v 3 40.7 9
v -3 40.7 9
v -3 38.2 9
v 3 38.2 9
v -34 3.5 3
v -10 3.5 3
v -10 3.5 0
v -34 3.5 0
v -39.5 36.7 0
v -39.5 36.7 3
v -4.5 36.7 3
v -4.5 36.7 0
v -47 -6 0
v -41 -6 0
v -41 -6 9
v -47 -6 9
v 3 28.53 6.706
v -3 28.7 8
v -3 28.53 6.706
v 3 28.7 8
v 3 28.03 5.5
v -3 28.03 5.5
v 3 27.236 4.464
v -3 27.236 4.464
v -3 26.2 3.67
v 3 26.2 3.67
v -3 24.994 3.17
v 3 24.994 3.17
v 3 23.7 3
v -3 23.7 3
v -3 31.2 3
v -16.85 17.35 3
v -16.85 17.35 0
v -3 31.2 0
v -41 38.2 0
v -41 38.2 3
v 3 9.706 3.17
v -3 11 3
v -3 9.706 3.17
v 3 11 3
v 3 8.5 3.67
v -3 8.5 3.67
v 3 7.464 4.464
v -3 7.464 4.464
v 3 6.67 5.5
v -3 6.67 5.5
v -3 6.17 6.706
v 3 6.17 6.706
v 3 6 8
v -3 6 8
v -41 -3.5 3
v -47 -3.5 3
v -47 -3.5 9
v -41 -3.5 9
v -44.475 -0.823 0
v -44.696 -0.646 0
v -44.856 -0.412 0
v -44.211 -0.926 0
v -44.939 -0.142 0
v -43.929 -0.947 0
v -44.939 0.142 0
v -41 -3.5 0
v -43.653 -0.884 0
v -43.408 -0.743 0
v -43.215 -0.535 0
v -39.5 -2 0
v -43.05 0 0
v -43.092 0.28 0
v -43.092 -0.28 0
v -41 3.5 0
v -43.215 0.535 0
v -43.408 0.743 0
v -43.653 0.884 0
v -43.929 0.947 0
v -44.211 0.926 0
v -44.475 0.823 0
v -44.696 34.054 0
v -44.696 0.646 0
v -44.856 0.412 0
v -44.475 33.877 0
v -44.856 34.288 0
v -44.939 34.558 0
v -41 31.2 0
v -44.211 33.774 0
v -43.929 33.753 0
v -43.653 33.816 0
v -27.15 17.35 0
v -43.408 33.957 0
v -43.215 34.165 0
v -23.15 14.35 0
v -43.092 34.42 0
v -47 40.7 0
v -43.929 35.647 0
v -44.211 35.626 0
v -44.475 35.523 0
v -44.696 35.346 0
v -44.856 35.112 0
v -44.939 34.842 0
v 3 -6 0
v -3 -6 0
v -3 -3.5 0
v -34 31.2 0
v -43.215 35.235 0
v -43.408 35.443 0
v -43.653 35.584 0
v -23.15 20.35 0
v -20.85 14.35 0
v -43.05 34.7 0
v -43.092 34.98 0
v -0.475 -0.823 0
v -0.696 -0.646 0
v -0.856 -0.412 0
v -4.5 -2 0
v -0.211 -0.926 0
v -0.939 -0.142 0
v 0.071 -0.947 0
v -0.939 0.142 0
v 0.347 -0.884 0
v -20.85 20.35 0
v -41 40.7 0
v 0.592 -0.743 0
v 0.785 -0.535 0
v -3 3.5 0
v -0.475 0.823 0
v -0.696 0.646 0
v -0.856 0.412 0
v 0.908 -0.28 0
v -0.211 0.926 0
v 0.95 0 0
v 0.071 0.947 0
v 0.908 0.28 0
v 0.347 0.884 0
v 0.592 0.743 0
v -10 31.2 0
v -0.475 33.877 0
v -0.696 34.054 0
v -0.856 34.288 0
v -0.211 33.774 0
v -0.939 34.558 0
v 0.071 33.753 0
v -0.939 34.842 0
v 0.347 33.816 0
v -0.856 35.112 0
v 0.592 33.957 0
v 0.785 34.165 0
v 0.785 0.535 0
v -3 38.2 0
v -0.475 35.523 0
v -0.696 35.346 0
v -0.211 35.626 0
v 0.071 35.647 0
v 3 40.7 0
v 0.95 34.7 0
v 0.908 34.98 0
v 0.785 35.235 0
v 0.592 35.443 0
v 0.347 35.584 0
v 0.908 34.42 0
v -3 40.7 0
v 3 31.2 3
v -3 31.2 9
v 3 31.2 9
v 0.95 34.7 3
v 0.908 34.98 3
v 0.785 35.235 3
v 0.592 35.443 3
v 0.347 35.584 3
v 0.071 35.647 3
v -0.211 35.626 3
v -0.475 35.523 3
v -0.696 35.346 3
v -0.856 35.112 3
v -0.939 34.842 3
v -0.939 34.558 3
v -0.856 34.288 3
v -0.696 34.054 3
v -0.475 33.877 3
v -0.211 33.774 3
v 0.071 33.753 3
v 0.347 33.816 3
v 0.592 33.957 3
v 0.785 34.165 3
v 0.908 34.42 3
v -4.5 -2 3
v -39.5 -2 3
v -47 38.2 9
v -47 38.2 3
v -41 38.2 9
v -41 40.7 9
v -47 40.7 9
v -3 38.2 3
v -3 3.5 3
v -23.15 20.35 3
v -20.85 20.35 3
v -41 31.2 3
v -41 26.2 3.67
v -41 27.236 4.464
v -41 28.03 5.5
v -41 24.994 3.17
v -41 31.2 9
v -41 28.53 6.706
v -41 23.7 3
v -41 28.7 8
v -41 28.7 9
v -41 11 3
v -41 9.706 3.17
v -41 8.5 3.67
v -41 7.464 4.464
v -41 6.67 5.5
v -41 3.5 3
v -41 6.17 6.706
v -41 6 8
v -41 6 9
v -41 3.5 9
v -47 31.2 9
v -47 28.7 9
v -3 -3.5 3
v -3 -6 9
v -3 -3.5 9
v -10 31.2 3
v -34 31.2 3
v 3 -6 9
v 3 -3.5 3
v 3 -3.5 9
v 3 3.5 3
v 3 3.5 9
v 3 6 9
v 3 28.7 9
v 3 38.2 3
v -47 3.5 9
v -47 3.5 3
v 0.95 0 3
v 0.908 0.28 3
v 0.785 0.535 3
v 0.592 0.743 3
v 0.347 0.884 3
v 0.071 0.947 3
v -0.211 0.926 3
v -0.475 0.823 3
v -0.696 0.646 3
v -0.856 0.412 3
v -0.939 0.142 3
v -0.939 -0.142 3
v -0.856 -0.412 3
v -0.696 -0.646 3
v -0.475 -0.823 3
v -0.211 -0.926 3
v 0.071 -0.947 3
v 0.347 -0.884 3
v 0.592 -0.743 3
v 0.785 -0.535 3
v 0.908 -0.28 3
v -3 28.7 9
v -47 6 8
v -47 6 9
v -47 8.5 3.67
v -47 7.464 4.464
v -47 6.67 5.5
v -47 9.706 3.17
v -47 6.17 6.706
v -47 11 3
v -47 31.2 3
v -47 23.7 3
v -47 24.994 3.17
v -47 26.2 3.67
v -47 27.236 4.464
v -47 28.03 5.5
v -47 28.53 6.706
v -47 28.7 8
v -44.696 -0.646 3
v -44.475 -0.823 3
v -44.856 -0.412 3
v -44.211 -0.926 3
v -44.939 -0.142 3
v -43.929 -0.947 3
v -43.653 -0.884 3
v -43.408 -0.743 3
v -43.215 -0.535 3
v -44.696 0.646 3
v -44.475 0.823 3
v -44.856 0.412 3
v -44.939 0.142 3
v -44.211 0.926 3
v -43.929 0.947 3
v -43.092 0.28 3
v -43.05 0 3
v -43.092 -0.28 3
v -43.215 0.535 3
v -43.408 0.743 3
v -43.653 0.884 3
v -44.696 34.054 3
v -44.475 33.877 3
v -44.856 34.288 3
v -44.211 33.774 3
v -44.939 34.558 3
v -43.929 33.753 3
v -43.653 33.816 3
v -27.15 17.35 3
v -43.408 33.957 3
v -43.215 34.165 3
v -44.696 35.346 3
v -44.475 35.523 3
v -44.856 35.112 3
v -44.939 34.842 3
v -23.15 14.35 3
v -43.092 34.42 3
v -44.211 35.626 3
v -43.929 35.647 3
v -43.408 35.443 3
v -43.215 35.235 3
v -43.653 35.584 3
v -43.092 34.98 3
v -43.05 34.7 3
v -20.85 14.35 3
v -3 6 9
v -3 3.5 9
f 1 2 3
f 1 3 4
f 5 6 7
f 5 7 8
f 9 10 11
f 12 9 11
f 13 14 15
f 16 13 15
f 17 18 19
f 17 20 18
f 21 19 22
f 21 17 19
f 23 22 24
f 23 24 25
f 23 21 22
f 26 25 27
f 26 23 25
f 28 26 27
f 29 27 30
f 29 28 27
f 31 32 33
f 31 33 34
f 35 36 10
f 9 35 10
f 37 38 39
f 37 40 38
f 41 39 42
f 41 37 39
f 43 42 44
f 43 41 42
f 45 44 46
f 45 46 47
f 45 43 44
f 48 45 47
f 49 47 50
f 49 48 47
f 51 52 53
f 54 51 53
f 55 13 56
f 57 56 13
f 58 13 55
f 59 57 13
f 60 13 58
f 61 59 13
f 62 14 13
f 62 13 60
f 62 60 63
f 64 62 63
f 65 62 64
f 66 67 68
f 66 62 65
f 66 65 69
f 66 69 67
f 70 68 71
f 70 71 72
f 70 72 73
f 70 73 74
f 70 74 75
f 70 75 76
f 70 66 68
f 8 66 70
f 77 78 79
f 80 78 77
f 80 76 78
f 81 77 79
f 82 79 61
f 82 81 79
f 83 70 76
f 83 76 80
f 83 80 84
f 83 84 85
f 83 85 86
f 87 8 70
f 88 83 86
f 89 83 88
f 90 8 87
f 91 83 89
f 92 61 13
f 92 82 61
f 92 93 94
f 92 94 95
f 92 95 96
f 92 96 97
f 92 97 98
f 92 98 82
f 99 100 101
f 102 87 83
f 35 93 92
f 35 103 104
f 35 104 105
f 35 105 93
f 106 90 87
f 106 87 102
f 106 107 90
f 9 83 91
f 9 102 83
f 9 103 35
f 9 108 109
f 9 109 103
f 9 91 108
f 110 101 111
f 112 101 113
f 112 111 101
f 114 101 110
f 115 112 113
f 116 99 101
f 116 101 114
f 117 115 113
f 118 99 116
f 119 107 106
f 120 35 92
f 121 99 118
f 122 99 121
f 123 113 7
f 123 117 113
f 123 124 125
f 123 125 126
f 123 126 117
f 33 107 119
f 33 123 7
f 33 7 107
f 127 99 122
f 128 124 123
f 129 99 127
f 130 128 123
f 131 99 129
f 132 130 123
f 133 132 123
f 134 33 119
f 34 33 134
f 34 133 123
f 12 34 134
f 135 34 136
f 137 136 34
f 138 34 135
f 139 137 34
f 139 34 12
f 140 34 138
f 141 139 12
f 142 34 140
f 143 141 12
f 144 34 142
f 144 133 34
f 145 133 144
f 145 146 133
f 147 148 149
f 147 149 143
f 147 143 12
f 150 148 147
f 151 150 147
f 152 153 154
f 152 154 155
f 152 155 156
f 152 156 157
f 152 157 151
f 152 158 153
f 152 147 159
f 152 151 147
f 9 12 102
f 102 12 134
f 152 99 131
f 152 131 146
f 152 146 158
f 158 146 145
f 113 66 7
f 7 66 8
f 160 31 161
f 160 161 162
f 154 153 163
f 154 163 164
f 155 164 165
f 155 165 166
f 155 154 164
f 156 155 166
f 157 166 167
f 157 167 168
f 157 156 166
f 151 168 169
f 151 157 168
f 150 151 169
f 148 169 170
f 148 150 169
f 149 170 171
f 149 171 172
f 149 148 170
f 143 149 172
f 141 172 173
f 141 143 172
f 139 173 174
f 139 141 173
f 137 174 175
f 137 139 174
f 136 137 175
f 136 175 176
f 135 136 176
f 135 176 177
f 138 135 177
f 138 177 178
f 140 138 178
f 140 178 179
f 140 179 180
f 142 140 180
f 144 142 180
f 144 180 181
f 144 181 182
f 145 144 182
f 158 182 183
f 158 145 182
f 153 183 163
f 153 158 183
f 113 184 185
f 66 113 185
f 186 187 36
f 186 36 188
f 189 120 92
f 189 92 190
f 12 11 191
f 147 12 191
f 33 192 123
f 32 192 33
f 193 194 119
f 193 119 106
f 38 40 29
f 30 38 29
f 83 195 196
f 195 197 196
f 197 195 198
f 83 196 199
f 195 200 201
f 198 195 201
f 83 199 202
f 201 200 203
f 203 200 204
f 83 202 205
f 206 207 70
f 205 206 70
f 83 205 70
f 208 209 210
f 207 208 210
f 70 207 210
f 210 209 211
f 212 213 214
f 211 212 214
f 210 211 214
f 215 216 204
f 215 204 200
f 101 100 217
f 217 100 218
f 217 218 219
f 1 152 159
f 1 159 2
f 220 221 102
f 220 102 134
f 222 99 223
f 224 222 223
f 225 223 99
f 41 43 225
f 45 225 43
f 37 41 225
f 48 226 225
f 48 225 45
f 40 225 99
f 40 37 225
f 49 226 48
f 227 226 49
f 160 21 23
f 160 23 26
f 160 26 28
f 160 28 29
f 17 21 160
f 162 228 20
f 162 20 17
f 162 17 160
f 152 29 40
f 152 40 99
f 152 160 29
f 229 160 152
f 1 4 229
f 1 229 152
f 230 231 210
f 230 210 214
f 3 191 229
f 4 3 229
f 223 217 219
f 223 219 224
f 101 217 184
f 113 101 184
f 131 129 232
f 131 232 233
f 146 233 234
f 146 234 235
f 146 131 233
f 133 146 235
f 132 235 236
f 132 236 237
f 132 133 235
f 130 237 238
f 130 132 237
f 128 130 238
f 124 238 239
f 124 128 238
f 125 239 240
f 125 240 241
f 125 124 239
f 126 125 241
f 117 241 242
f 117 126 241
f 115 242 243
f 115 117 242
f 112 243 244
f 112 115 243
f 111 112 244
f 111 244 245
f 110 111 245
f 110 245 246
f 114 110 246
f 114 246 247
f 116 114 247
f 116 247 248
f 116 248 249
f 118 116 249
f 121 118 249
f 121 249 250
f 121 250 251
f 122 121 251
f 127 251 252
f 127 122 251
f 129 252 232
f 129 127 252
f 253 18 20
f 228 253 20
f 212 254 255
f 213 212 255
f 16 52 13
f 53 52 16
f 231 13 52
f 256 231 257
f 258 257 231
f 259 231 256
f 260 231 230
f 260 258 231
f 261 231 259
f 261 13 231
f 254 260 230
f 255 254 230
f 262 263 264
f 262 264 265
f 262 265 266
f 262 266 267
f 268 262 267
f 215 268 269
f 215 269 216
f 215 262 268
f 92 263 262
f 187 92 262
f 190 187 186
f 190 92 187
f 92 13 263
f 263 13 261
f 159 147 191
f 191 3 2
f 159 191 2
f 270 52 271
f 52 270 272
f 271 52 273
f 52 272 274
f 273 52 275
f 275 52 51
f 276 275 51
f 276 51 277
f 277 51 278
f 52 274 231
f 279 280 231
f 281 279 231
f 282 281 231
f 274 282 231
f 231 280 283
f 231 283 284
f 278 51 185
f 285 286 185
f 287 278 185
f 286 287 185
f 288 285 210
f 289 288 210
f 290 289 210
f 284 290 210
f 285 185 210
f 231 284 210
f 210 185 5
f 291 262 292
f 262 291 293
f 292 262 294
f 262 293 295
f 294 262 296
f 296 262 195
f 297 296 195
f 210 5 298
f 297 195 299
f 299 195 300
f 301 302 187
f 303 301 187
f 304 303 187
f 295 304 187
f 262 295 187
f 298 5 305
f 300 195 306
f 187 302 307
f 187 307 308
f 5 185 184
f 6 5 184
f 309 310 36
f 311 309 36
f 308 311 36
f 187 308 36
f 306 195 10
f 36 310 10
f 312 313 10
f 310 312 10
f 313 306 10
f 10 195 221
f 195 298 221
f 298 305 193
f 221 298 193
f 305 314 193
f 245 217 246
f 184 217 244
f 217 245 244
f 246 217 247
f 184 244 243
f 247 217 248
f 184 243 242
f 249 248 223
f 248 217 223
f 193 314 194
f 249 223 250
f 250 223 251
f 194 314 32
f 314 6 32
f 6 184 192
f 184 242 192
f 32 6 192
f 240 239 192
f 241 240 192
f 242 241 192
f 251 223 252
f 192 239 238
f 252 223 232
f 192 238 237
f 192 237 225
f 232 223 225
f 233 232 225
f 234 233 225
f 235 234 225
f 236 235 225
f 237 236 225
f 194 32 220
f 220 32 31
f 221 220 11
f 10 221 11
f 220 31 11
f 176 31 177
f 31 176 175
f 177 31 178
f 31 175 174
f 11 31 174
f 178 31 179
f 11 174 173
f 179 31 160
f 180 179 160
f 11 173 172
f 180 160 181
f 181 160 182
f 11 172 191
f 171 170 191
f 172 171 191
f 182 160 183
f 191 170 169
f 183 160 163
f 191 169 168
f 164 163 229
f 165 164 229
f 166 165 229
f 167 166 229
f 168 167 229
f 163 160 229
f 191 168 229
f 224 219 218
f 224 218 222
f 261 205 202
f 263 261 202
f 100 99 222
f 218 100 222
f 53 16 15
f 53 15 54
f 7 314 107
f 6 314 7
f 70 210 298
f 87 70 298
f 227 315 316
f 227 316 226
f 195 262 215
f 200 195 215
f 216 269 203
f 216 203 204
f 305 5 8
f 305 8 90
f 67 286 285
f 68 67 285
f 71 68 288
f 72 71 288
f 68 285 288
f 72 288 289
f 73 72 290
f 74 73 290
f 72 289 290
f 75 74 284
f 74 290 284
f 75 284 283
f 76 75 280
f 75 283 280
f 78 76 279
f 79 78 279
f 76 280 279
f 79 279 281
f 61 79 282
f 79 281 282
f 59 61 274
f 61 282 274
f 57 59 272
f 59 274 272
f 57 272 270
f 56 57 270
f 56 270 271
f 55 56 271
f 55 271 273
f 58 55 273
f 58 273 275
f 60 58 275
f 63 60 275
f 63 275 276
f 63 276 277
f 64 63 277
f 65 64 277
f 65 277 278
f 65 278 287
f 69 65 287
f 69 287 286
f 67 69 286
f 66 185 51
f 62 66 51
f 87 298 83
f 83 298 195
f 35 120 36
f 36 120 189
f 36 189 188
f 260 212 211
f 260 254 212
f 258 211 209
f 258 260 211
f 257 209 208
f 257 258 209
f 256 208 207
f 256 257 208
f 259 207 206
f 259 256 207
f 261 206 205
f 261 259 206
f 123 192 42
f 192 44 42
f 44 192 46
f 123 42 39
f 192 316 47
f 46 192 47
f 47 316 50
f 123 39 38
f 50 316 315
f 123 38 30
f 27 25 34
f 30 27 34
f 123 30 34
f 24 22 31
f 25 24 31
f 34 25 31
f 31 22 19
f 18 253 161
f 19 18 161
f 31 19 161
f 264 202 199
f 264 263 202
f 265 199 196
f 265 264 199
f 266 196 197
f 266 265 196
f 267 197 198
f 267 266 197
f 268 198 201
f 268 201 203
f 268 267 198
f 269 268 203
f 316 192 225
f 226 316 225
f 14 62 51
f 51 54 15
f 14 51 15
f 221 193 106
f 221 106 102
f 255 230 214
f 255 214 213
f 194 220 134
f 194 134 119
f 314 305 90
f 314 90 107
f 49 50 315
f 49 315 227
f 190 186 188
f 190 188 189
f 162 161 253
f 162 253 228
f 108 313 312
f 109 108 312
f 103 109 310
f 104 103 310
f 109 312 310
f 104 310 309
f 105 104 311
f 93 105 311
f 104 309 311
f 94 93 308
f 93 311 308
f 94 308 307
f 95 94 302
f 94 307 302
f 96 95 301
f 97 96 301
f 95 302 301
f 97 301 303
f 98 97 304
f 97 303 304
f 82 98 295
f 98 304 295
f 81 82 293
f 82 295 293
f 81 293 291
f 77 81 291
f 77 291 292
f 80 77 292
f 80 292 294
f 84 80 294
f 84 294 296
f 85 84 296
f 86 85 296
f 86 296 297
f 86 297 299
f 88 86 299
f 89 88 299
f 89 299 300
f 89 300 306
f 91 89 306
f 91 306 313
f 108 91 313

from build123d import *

# Parameters (mm, degrees)
ESQUISSE1_W                    = 6
ESQUISSE1_H                    = 42.7
ESQUISSE1_R                    = 0.95
BOSS_EXTRU_1_DEPTH             = 3
ESQUISSE2_W                    = 6
ESQUISSE2_H                    = 2.5
BOSS_EXTRU_2_DEPTH             = 6
BOSS_EXTRU_2_DIRECTION_2_REACH = 40.932
ESQUISSE3_W                    = 3
ESQUISSE3_H                    = 46.7
BOSS_EXTRU_4_DEPTH             = 44
ESQUISSE4_W                    = 9
ESQUISSE4_H                    = 2.5
BOSS_EXTRU_5_DEPTH             = 6
ENL_V_MAT_EXTRU_1_REACH        = 64.462
ESQUISSE5_R                    = 0.95
ENL_V_MAT_EXTRU_2_REACH        = 64.462
CONG_1_R                       = 5


with BuildPart() as part:
    # Esquisse1 → Boss.-Extru.1 (new body)
    with BuildSketch(Plane.XY):
        with Locations((0, 17.35)):
            Rectangle(ESQUISSE1_W, ESQUISSE1_H)
        Circle(ESQUISSE1_R, mode=Mode.SUBTRACT)
        with Locations((0, 34.7)):
            Circle(ESQUISSE1_R, mode=Mode.SUBTRACT)
    extrude(amount=BOSS_EXTRU_1_DEPTH)

    # Esquisse2 → Boss.-Extru.2 (add)
    with BuildSketch(Plane.XY.offset(3)):
        with Locations((0, 4.75)):
            Rectangle(ESQUISSE2_W, ESQUISSE2_H)
        with Locations((0, 39.45)):
            Rectangle(ESQUISSE2_W, ESQUISSE2_H)
        with Locations((0, 29.95)):
            Rectangle(ESQUISSE2_W, ESQUISSE2_H)
        with Locations((0, -4.75)):
            Rectangle(ESQUISSE2_W, ESQUISSE2_H)
    extrude(amount=BOSS_EXTRU_2_DEPTH)

    # Boss.-Extru.2 direction 2: up to this face of the body (flat: up to its plane)
    boss_extru_2_direction_2_end = Plane(part.part.faces().sort_by_distance((0, 17.35, 0))[0])
    # Esquisse2 → Boss.-Extru.2 direction 2 (add, up to the picked face)
    with BuildSketch(Plane.XY.offset(3), mode=Mode.PRIVATE) as boss_extru_2_direction_2_sk1:
        with Locations((0, 4.75)):
            Rectangle(ESQUISSE2_W, ESQUISSE2_H)
    boss_extru_2_direction_2_tool1 = split(extrude(boss_extru_2_direction_2_sk1.sketch, amount=-BOSS_EXTRU_2_DIRECTION_2_REACH, mode=Mode.PRIVATE), bisect_by=boss_extru_2_direction_2_end, keep=Keep.BOTH, mode=Mode.PRIVATE)
    # Esquisse2 → Boss.-Extru.2 direction 2 (add, up to the picked face)
    with BuildSketch(Plane.XY.offset(3), mode=Mode.PRIVATE) as boss_extru_2_direction_2_sk2:
        with Locations((0, 39.45)):
            Rectangle(ESQUISSE2_W, ESQUISSE2_H)
    boss_extru_2_direction_2_tool2 = split(extrude(boss_extru_2_direction_2_sk2.sketch, amount=-BOSS_EXTRU_2_DIRECTION_2_REACH, mode=Mode.PRIVATE), bisect_by=boss_extru_2_direction_2_end, keep=Keep.BOTH, mode=Mode.PRIVATE)
    # Esquisse2 → Boss.-Extru.2 direction 2 (add, up to the picked face)
    with BuildSketch(Plane.XY.offset(3), mode=Mode.PRIVATE) as boss_extru_2_direction_2_sk3:
        with Locations((0, 29.95)):
            Rectangle(ESQUISSE2_W, ESQUISSE2_H)
    boss_extru_2_direction_2_tool3 = split(extrude(boss_extru_2_direction_2_sk3.sketch, amount=-BOSS_EXTRU_2_DIRECTION_2_REACH, mode=Mode.PRIVATE), bisect_by=boss_extru_2_direction_2_end, keep=Keep.BOTH, mode=Mode.PRIVATE)
    # Esquisse2 → Boss.-Extru.2 direction 2 (add, up to the picked face)
    with BuildSketch(Plane.XY.offset(3), mode=Mode.PRIVATE) as boss_extru_2_direction_2_sk4:
        with Locations((0, -4.75)):
            Rectangle(ESQUISSE2_W, ESQUISSE2_H)
    boss_extru_2_direction_2_tool4 = split(extrude(boss_extru_2_direction_2_sk4.sketch, amount=-BOSS_EXTRU_2_DIRECTION_2_REACH, mode=Mode.PRIVATE), bisect_by=boss_extru_2_direction_2_end, keep=Keep.BOTH, mode=Mode.PRIVATE)
    add(boss_extru_2_direction_2_tool1.solids().sort_by(Axis((0, 4.75, 3), (0, 0, -1)))[0])
    add(boss_extru_2_direction_2_tool2.solids().sort_by(Axis((0, 39.45, 3), (0, 0, -1)))[0])
    add(boss_extru_2_direction_2_tool3.solids().sort_by(Axis((0, 29.95, 3), (0, 0, -1)))[0])
    add(boss_extru_2_direction_2_tool4.solids().sort_by(Axis((0, -4.75, 3), (0, 0, -1)))[0])

    # Esquisse3 → Boss.-Extru.4 (add)
    with BuildSketch(Plane.ZY.offset(3)):
        with Locations((1.5, 17.35)):
            Rectangle(ESQUISSE3_W, ESQUISSE3_H)
    extrude(amount=BOSS_EXTRU_4_DEPTH)

    # Esquisse4 → Boss.-Extru.5 (add)
    with BuildSketch(Plane.ZY.offset(47)):
        with Locations((4.5, 39.45)):
            Rectangle(ESQUISSE4_W, ESQUISSE4_H)
        with Locations((4.5, 29.95)):
            Rectangle(ESQUISSE4_W, ESQUISSE4_H)
        with Locations((4.5, 4.75)):
            Rectangle(ESQUISSE4_W, ESQUISSE4_H)
        with Locations((4.5, -4.75)):
            Rectangle(ESQUISSE4_W, ESQUISSE4_H)
    extrude(amount=-BOSS_EXTRU_5_DEPTH)

    # Esquisse5 → Enlèv. mat.-Extru.1 (cut, up to next)
    with BuildSketch(Plane.XY.offset(3), mode=Mode.PRIVATE) as enl_v_mat_extru_1_sk1:
        with Locations((-44, 34.7)):
            Circle(ESQUISSE5_R)
    enl_v_mat_extru_1_tool1 = extrude(enl_v_mat_extru_1_sk1.sketch, amount=-ENL_V_MAT_EXTRU_1_REACH, mode=Mode.PRIVATE) & part.part
    # Esquisse5 → Enlèv. mat.-Extru.1 (cut, up to next)
    with BuildSketch(Plane.XY.offset(3), mode=Mode.PRIVATE) as enl_v_mat_extru_1_sk2:
        with Locations((-44, 0)):
            Circle(ESQUISSE5_R)
    enl_v_mat_extru_1_tool2 = extrude(enl_v_mat_extru_1_sk2.sketch, amount=-ENL_V_MAT_EXTRU_1_REACH, mode=Mode.PRIVATE) & part.part
    add(enl_v_mat_extru_1_tool1.solids().sort_by_distance((-44, 34.7, 3))[0], mode=Mode.SUBTRACT)
    add(enl_v_mat_extru_1_tool2.solids().sort_by_distance((-44, 0, 3))[0], mode=Mode.SUBTRACT)

    # Esquisse6 → Enlèv. mat.-Extru.2 (cut, up to next)
    with BuildSketch(Plane.XY.offset(3), mode=Mode.PRIVATE) as enl_v_mat_extru_2_sk1:
        Polygon((-20.85, 20.35), (-23.15, 20.35), (-34, 31.2), (-10, 31.2), align=None)
    enl_v_mat_extru_2_tool1 = extrude(enl_v_mat_extru_2_sk1.sketch, amount=-ENL_V_MAT_EXTRU_2_REACH, mode=Mode.PRIVATE) & part.part
    # Esquisse6 → Enlèv. mat.-Extru.2 (cut, up to next)
    with BuildSketch(Plane.XY.offset(3), mode=Mode.PRIVATE) as enl_v_mat_extru_2_sk2:
        Polygon((-41, 28.7), (-41, 6), (-41, 3.5), (-27.15, 17.35), (-41, 31.2), align=None)
    enl_v_mat_extru_2_tool2 = extrude(enl_v_mat_extru_2_sk2.sketch, amount=-ENL_V_MAT_EXTRU_2_REACH, mode=Mode.PRIVATE) & part.part
    # Esquisse6 → Enlèv. mat.-Extru.2 (cut, up to next)
    with BuildSketch(Plane.XY.offset(3), mode=Mode.PRIVATE) as enl_v_mat_extru_2_sk3:
        Polygon((-3, 28.7), (-3, 6), (-3, 3.5), (-16.85, 17.35), (-3, 31.2), align=None)
    enl_v_mat_extru_2_tool3 = extrude(enl_v_mat_extru_2_sk3.sketch, amount=-ENL_V_MAT_EXTRU_2_REACH, mode=Mode.PRIVATE) & part.part
    # Esquisse6 → Enlèv. mat.-Extru.2 (cut, up to next)
    with BuildSketch(Plane.XY.offset(3), mode=Mode.PRIVATE) as enl_v_mat_extru_2_sk4:
        Polygon((-34, 3.5), (-23.15, 14.35), (-20.85, 14.35), (-10, 3.5), align=None)
    enl_v_mat_extru_2_tool4 = extrude(enl_v_mat_extru_2_sk4.sketch, amount=-ENL_V_MAT_EXTRU_2_REACH, mode=Mode.PRIVATE) & part.part
    # Esquisse6 → Enlèv. mat.-Extru.2 (cut, up to next)
    with BuildSketch(Plane.XY.offset(3), mode=Mode.PRIVATE) as enl_v_mat_extru_2_sk5:
        Polygon((-39.5, -2), (-41, -3.5), (-41, -6), (-3, -6), (-3, -3.5), (-4.5, -2), align=None)
    enl_v_mat_extru_2_tool5 = extrude(enl_v_mat_extru_2_sk5.sketch, amount=-ENL_V_MAT_EXTRU_2_REACH, mode=Mode.PRIVATE) & part.part
    # Esquisse6 → Enlèv. mat.-Extru.2 (cut, up to next)
    with BuildSketch(Plane.XY.offset(3), mode=Mode.PRIVATE) as enl_v_mat_extru_2_sk6:
        Polygon((-41, 40.7), (-41, 38.2), (-39.5, 36.7), (-4.5, 36.7), (-3, 38.2), (-3, 40.7), align=None)
    enl_v_mat_extru_2_tool6 = extrude(enl_v_mat_extru_2_sk6.sketch, amount=-ENL_V_MAT_EXTRU_2_REACH, mode=Mode.PRIVATE) & part.part
    add(enl_v_mat_extru_2_tool1.solids().sort_by_distance((-22, 27.267047, 3))[0], mode=Mode.SUBTRACT)
    add(enl_v_mat_extru_2_tool2.solids().sort_by_distance((-36.383333, 17.35, 3))[0], mode=Mode.SUBTRACT)
    add(enl_v_mat_extru_2_tool3.solids().sort_by_distance((-7.616667, 17.35, 3))[0], mode=Mode.SUBTRACT)
    add(enl_v_mat_extru_2_tool4.solids().sort_by_distance((-22, 7.432953, 3))[0], mode=Mode.SUBTRACT)
    add(enl_v_mat_extru_2_tool5.solids().sort_by_distance((-22, -4.022538, 3))[0], mode=Mode.SUBTRACT)
    add(enl_v_mat_extru_2_tool6.solids().sort_by_distance((-22, 38.722538, 3))[0], mode=Mode.SUBTRACT)

    # Congé1
    cong_1_edges = [part.edges().sort_by_distance(p)[0] for p in [
        (-44, 28.7, 3),
        (-44, 6, 3),
        (0, 6, 3),
        (0, 28.7, 3),
    ]]
    fillet(cong_1_edges, radius=CONG_1_R)


solid = part.part
